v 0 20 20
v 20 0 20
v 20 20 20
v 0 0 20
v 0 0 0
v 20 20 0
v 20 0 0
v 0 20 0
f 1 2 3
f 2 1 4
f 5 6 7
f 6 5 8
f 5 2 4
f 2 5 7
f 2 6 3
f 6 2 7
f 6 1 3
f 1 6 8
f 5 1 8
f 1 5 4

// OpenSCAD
// SYMPTOM: a non-rigid (scaling/shear) multmatrix left the UNTRANSFORMED source
//   object as a stray orphan document root, so a scaled solid appeared twice --
//   once raw, once transformed. Discovered via polyhedron-nonplanar-tests: a
//   120-point polyhedron under a 0.02 scale imported as TWO roots, the correct
//   scaled result (vol 1.654) AND a leaked raw copy (vol 206803), wrecking the
//   total (206806 vs OpenSCAD 2.943).
// CAUSE: importCSG.p_multmatrix_action has three transform paths. The rigid
//   path reuses `part` (updates its Placement) and the MatrixTransform path
//   links `part` via obj.Base, so both keep the source non-root. The
//   transformGeometry fallback (the useMultmatrixFeature==False branch, which
//   is the headless default) bakes part.Shape.transformGeometry(M) into a new
//   Part::Feature but never consumed `part` -> orphan root.
// FIX: importCSG.py p_multmatrix_action -> after baking the transformed shape,
//   remove `part` and its subtree (OutListRecursive) from the document; its
//   geometry is fully copied into new_part and nothing else references it.
//   Commit <pending>.
// EXPECTED (OpenSCAD): scaling a 10x10x10 cube by 2 in every axis is one solid
//   of volume 10^3 * 2^3 = 8000 -- exactly ONE document root, no leftover
//   1000-unit raw cube. (The polyhedron geometry itself was already correct;
//   this is the multmatrix leak that nonplanar-tests surfaced.)
multmatrix([[2, 0, 0, 0], [0, 2, 0, 0], [0, 0, 2, 0], [0, 0, 0, 1]])
	cube([10, 10, 10]);
